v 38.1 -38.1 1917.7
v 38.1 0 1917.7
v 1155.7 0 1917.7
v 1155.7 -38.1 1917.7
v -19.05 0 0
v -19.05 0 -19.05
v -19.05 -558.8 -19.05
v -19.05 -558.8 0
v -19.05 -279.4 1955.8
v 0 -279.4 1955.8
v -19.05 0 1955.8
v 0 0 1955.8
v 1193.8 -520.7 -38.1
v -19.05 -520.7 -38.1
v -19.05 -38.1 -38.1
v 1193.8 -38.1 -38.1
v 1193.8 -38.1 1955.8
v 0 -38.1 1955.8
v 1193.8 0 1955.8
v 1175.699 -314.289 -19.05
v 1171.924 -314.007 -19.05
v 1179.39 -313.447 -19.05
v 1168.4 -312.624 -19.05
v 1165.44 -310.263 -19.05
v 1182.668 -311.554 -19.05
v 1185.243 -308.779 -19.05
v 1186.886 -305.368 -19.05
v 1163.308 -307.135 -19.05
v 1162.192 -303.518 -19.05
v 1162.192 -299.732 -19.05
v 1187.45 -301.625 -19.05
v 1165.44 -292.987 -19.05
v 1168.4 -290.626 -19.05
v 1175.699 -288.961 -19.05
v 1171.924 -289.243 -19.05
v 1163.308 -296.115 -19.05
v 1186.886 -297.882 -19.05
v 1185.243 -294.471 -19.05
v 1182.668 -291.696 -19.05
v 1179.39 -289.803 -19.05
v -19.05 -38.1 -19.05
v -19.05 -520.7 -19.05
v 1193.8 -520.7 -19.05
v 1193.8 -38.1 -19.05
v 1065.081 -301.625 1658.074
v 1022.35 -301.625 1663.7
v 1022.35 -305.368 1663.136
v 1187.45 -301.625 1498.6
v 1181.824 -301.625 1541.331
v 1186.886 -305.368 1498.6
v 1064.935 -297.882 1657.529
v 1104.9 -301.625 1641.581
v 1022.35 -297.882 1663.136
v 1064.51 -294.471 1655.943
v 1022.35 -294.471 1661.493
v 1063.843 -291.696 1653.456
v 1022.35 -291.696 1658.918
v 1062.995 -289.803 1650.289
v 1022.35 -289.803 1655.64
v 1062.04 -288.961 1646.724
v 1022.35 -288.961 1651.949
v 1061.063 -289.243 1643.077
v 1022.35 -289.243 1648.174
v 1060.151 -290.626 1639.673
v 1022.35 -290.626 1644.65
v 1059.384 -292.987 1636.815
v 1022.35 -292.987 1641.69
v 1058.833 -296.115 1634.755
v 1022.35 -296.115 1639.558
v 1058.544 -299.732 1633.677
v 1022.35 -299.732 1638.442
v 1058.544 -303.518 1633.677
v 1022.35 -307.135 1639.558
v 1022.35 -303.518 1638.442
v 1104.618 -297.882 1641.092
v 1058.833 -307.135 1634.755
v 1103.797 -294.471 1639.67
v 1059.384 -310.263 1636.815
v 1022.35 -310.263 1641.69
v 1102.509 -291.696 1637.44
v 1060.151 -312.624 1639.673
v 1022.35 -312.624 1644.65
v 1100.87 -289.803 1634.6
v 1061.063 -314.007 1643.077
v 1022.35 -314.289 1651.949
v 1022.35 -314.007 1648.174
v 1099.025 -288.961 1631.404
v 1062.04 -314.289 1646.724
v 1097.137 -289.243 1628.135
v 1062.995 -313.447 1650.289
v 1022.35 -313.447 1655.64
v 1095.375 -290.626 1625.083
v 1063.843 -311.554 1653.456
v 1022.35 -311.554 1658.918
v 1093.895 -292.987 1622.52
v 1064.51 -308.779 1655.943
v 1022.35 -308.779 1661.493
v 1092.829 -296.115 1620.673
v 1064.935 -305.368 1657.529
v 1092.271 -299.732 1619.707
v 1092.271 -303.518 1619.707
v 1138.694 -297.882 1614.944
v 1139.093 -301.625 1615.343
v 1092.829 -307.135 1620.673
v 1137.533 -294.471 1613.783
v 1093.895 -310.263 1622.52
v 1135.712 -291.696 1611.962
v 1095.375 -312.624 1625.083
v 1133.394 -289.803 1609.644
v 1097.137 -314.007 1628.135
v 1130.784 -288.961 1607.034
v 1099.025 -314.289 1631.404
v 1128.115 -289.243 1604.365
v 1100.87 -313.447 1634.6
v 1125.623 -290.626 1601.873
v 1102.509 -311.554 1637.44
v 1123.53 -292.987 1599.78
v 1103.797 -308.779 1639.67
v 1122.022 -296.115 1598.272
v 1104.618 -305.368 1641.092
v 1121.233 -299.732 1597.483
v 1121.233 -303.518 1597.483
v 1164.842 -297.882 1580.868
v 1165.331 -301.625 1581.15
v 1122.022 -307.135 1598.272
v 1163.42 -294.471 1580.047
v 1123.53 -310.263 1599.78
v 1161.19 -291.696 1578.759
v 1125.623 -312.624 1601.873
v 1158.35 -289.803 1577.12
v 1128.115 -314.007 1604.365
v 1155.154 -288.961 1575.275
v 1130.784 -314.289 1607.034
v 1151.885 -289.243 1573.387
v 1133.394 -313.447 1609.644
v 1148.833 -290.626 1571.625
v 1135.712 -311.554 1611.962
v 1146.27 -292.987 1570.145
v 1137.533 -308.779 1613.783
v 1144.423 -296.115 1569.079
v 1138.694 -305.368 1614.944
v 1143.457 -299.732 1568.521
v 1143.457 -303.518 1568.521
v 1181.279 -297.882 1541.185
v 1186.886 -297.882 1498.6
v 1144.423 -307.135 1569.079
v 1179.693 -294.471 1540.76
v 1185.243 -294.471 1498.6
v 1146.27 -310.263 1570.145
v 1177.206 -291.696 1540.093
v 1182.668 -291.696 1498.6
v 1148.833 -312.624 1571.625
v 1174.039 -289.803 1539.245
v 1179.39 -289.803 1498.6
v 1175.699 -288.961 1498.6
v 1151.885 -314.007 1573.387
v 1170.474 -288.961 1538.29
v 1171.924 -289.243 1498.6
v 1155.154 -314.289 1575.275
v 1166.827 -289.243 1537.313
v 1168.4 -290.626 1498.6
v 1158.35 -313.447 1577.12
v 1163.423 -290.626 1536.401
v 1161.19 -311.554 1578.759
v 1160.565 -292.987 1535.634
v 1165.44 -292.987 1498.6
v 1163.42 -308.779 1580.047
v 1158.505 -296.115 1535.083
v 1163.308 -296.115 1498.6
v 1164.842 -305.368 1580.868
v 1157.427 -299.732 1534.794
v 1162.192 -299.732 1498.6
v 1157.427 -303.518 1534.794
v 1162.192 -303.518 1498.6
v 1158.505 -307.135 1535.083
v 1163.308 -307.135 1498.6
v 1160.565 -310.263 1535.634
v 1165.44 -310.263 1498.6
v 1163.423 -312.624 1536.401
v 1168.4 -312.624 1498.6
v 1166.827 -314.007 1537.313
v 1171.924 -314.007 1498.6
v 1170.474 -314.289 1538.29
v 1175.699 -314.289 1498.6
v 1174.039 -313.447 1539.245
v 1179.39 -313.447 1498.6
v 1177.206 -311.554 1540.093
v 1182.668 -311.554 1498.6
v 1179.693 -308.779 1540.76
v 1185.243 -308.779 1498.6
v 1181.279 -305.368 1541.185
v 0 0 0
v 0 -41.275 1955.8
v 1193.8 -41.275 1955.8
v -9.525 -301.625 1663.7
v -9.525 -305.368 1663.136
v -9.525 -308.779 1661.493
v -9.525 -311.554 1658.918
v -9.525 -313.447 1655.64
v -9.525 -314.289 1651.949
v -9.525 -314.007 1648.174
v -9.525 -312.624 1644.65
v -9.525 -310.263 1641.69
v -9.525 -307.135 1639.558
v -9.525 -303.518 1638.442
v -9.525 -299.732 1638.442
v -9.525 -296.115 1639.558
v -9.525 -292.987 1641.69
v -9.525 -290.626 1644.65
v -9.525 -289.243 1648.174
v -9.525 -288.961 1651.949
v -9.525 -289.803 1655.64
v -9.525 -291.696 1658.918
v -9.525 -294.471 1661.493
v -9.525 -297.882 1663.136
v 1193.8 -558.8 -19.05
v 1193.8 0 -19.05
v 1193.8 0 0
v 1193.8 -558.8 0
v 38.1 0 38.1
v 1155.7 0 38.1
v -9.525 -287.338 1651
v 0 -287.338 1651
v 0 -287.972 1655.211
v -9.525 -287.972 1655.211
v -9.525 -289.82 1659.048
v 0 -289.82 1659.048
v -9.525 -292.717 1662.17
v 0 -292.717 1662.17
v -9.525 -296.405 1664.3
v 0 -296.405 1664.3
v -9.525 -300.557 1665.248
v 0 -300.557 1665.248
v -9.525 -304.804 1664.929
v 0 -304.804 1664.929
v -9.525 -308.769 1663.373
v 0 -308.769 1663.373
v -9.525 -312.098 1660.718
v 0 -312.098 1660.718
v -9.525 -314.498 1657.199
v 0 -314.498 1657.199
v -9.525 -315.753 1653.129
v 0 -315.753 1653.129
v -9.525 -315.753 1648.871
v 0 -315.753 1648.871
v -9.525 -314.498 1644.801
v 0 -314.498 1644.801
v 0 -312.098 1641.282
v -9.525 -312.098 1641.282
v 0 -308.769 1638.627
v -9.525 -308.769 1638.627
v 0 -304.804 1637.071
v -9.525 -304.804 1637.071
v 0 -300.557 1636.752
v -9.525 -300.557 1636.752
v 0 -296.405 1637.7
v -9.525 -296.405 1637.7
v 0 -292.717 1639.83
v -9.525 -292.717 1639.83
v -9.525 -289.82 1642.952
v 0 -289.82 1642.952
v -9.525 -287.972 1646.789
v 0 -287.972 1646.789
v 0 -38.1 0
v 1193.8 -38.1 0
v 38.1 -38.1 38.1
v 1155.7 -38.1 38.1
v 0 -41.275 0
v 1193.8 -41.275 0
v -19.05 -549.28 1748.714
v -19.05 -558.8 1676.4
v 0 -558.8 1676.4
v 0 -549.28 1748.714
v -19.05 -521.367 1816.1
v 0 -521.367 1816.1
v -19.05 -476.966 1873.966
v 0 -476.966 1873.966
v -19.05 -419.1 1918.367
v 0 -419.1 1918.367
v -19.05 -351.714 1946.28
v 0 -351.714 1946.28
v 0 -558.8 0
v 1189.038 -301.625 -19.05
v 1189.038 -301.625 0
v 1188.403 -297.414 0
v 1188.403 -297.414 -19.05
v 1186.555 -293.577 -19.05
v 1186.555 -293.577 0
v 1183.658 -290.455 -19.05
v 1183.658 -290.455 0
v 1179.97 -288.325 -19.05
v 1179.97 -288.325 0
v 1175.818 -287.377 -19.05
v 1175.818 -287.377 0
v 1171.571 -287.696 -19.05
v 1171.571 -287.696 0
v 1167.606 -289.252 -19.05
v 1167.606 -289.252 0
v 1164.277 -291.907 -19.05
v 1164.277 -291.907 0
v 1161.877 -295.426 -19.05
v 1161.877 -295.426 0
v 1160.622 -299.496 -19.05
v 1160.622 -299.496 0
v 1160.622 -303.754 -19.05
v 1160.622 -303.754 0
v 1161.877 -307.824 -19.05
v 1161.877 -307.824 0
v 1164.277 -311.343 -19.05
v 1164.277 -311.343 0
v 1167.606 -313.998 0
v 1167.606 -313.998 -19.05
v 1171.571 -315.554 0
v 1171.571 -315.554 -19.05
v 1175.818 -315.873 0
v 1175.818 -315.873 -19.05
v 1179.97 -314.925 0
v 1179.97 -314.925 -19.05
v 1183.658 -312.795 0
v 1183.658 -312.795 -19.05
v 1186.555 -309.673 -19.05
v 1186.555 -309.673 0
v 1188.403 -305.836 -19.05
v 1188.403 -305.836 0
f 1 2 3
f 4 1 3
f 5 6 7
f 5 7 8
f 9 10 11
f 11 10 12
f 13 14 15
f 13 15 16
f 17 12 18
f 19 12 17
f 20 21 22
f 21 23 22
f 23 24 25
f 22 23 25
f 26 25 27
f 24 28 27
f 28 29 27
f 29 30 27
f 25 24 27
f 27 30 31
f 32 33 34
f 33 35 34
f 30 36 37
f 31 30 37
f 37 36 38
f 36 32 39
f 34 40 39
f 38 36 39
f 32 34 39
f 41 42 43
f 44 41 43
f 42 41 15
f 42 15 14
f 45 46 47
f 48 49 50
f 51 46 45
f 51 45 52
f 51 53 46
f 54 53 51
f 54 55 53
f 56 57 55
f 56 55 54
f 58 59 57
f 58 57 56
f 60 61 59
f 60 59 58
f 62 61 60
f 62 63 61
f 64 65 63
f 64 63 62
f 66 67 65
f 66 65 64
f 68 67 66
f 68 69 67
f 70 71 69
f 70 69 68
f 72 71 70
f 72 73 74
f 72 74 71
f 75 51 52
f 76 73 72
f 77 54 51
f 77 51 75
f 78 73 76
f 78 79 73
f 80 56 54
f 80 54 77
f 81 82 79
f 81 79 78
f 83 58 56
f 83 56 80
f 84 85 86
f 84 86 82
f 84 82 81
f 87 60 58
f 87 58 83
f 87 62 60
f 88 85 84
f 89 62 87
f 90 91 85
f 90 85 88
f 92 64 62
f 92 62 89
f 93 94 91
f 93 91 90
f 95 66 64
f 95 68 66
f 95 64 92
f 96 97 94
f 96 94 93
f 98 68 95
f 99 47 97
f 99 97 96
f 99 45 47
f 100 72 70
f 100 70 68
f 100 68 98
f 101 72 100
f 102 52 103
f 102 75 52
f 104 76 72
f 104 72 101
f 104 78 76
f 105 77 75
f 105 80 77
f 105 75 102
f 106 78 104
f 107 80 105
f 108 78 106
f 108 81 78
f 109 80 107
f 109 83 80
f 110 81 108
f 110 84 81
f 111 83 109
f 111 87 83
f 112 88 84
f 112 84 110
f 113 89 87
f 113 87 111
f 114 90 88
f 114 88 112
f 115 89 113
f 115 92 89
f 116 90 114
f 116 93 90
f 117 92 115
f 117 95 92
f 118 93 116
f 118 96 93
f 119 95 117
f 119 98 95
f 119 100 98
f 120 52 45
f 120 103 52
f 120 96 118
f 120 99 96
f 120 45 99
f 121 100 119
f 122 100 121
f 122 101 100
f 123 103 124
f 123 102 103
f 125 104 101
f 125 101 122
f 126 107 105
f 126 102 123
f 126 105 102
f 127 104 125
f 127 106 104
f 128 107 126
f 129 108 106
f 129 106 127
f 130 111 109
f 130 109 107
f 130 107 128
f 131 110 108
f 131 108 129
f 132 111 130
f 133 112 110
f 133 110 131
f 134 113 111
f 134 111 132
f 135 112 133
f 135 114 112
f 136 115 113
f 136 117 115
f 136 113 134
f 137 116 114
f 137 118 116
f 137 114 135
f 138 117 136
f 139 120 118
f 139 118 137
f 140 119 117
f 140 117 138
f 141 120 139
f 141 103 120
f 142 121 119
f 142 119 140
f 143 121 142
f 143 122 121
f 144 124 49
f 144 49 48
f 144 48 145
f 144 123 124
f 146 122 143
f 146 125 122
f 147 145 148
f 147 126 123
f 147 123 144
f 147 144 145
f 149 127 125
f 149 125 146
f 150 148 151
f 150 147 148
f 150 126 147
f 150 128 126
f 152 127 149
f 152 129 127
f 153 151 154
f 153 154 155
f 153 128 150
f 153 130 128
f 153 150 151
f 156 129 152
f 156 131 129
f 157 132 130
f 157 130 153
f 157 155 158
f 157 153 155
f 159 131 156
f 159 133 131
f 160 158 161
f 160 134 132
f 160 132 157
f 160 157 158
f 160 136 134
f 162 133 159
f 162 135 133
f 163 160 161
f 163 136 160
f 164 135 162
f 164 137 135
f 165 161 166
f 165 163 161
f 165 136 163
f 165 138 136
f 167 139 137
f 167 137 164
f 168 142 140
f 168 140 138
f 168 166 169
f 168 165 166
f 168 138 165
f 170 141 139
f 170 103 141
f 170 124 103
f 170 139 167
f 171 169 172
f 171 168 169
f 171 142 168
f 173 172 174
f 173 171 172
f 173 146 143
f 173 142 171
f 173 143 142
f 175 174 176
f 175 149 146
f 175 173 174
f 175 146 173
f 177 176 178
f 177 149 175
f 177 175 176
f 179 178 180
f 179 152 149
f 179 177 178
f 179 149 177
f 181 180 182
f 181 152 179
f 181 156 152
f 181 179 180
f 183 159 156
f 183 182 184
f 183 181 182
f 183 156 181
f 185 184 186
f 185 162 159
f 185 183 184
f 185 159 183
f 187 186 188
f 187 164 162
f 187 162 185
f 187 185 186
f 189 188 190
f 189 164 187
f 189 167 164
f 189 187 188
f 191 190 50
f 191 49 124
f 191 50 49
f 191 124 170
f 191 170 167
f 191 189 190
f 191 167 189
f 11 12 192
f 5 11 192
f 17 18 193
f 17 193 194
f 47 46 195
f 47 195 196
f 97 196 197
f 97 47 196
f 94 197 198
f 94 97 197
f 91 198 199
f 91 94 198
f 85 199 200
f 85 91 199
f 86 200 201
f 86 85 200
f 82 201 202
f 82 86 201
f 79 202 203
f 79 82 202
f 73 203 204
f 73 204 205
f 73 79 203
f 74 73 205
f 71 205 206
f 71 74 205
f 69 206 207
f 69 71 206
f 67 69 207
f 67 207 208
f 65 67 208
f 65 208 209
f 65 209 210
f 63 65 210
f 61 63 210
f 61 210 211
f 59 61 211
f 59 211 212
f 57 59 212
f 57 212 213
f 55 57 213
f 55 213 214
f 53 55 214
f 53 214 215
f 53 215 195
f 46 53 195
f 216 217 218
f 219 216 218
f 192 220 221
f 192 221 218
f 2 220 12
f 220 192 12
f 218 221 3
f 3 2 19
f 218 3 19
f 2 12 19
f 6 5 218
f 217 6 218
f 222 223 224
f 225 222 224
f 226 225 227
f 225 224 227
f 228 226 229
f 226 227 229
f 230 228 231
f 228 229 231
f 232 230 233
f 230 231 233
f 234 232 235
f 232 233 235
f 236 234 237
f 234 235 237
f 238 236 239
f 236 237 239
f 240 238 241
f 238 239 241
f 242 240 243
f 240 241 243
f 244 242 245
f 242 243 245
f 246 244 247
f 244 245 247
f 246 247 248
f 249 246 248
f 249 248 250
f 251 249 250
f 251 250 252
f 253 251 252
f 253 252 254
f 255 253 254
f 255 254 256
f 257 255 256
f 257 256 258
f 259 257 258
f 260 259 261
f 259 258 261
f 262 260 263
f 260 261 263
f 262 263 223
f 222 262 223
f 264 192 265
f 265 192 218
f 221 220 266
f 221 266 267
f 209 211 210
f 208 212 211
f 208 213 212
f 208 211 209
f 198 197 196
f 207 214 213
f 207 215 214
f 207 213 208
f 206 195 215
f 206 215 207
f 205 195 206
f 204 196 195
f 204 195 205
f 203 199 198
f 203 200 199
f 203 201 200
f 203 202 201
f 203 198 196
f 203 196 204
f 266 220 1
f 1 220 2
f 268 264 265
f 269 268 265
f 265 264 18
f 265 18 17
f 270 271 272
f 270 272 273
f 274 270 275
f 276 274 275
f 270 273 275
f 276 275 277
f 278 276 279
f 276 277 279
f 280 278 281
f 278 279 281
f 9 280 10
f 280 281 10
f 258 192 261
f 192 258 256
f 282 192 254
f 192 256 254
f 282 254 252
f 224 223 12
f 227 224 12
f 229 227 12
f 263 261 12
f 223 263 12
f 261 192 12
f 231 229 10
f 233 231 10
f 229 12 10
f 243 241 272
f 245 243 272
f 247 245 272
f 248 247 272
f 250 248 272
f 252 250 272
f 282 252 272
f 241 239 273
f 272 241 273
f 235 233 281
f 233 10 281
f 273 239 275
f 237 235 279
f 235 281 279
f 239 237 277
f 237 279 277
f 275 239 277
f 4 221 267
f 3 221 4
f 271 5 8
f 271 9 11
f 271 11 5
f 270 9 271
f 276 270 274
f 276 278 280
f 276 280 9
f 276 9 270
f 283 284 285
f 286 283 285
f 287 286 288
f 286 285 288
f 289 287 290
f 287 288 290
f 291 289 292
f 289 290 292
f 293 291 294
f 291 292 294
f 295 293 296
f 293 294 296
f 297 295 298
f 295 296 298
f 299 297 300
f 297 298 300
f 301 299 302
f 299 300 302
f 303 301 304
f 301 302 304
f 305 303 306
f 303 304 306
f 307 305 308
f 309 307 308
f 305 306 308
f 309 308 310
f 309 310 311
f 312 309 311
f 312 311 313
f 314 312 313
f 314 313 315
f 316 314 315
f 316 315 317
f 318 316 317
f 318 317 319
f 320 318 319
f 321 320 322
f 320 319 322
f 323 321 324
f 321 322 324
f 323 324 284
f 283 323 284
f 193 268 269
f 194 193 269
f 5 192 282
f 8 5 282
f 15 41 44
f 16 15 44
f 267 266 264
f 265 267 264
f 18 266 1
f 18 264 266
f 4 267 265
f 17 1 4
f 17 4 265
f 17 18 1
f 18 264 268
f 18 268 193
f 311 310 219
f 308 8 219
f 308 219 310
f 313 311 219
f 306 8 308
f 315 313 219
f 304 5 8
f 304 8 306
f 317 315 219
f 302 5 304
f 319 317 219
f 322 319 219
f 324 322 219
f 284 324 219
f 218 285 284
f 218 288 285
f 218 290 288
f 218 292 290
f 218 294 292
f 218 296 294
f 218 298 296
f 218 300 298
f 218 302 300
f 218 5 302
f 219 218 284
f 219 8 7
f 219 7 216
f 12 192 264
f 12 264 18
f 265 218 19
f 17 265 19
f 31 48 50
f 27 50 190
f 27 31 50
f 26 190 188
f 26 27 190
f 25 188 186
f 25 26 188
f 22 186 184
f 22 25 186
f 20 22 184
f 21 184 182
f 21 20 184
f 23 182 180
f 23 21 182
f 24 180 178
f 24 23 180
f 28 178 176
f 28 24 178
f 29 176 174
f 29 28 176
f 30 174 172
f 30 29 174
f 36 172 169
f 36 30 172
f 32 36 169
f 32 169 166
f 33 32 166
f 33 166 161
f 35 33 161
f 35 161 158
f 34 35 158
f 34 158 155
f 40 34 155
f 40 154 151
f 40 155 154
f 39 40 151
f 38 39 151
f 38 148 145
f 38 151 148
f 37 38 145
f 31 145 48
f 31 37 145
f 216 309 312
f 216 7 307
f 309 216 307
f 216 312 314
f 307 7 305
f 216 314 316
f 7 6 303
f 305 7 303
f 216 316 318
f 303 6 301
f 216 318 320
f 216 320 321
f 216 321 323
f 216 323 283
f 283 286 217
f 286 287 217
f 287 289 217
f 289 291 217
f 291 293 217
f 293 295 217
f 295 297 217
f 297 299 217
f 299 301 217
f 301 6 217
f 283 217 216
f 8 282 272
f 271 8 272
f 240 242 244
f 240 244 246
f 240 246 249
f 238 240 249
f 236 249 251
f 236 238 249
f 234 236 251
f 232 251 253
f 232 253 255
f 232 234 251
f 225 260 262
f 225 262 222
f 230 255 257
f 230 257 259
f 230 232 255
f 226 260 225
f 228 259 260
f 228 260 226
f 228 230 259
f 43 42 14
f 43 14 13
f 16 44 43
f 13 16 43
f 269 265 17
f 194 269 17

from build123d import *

# Parameters (mm, degrees)
F1_W      = 1193.8
F1_H      = 1955.8
F1_W_2    = 1117.6
F1_H_2    = 1879.6
F2_DEPTH  = 38.1
F3_W      = 1193.8
F3_H      = 1955.8
F4_DEPTH  = 3.175
F5_W      = 1212.85
F5_H      = 19.05
F6_DEPTH  = 558.8
F8_DEPTH  = 19.05
F11_R     = 14.2875
F12_DEPTH = 9.525
F13_R     = 14.2875
F14_DEPTH = 19.05
F15_W     = 1212.85
F15_H     = 482.6
F16_DEPTH = 19.05
F17_R     = 12.7


with BuildPart() as f2:
    # F1 (on Front) → F2 (new body)
    with BuildSketch(Plane.XZ):
        with Locations((596.9, 977.9)):
            Rectangle(F1_W, F1_H)
        with Locations((596.9, 977.9)):
            Rectangle(F1_W_2, F1_H_2, mode=Mode.SUBTRACT)
    extrude(amount=F2_DEPTH)


with BuildPart() as f4:
    # F3 (on face) → F4 (new body)
    with BuildSketch(Plane.XZ.offset(38.1)):
        with Locations((596.9, 977.9)):
            Rectangle(F3_W, F3_H)
    extrude(amount=F4_DEPTH)


with BuildPart() as f6:
    # F5 (on Front) → F6 (new body)
    with BuildSketch(Plane.XZ):
        with Locations((587.375, -9.525)):
            Rectangle(F5_W, F5_H)
    extrude(amount=F6_DEPTH)

    # F13 (on face) → F14 (cut, through all)
    with BuildSketch(Plane.XY):
        with Locations((1174.75, -301.625)):
            Circle(F13_R)
    extrude(amount=-F14_DEPTH, mode=Mode.SUBTRACT)


with BuildPart() as f8:
    # F7 (on face) → F8 (new body, through all)
    with BuildSketch(Plane(origin=(0, 0, 0), x_dir=(0, -1, 0), z_dir=(-1, 0, 0))):
        with BuildLine():
            Line((0, 51.9559979439), (0, 0))
            Line((0, 0), (558.8, 0))
            Line((558.8, 0), (558.8, 1676.4))
            ThreePointArc((558.8, 1676.4), (476.9656346635, 1873.9656346635), (279.4, 1955.8))
            Line((279.4, 1955.8), (38.1, 1955.8))
            Line((38.1, 1955.8), (0, 1955.8))
            Line((0, 1955.8), (0, 51.9559979439))
        make_face()
    extrude(amount=F8_DEPTH)

    # F11 (on face) → F12 (cut)
    with BuildSketch(Plane.YZ):
        with Locations((-301.625, 1651)):
            Circle(F11_R)
    extrude(amount=-F12_DEPTH, mode=Mode.SUBTRACT)


with BuildPart() as f16:
    # F15 (on face) → F16 (new body)
    with BuildSketch(Plane(origin=(0, 0, -19.05), x_dir=(1, 0, 0), z_dir=(0, 0, -1))):
        with Locations((587.375, 279.4)):
            Rectangle(F15_W, F15_H)
    extrude(amount=F16_DEPTH)


with BuildPart() as f18:
    # F18: sweep along a path in F10
    with BuildLine(Plane.XZ.offset(301.625)) as f18_path:
        Line((-9.525, 1651), (0, 1651))
        Line((0, 1651), (1022.35, 1651))
        ThreePointArc((1022.35, 1651), (1130.1130734528, 1606.3630734528), (1174.75, 1498.6))
        Line((1174.75, 1498.6), (1174.75, 0))
        Line((1174.75, 0), (1174.75, -19.05))
    # F17 (on face) → F18 (sweep)
    with BuildSketch(Plane.XY.offset(-19.05)):
        with Locations((1174.75, -301.625)):
            Circle(F17_R)
    sweep(path=f18_path.line)


solid = Compound([f2.part, f4.part, f6.part, f8.part, f16.part, f18.part])
